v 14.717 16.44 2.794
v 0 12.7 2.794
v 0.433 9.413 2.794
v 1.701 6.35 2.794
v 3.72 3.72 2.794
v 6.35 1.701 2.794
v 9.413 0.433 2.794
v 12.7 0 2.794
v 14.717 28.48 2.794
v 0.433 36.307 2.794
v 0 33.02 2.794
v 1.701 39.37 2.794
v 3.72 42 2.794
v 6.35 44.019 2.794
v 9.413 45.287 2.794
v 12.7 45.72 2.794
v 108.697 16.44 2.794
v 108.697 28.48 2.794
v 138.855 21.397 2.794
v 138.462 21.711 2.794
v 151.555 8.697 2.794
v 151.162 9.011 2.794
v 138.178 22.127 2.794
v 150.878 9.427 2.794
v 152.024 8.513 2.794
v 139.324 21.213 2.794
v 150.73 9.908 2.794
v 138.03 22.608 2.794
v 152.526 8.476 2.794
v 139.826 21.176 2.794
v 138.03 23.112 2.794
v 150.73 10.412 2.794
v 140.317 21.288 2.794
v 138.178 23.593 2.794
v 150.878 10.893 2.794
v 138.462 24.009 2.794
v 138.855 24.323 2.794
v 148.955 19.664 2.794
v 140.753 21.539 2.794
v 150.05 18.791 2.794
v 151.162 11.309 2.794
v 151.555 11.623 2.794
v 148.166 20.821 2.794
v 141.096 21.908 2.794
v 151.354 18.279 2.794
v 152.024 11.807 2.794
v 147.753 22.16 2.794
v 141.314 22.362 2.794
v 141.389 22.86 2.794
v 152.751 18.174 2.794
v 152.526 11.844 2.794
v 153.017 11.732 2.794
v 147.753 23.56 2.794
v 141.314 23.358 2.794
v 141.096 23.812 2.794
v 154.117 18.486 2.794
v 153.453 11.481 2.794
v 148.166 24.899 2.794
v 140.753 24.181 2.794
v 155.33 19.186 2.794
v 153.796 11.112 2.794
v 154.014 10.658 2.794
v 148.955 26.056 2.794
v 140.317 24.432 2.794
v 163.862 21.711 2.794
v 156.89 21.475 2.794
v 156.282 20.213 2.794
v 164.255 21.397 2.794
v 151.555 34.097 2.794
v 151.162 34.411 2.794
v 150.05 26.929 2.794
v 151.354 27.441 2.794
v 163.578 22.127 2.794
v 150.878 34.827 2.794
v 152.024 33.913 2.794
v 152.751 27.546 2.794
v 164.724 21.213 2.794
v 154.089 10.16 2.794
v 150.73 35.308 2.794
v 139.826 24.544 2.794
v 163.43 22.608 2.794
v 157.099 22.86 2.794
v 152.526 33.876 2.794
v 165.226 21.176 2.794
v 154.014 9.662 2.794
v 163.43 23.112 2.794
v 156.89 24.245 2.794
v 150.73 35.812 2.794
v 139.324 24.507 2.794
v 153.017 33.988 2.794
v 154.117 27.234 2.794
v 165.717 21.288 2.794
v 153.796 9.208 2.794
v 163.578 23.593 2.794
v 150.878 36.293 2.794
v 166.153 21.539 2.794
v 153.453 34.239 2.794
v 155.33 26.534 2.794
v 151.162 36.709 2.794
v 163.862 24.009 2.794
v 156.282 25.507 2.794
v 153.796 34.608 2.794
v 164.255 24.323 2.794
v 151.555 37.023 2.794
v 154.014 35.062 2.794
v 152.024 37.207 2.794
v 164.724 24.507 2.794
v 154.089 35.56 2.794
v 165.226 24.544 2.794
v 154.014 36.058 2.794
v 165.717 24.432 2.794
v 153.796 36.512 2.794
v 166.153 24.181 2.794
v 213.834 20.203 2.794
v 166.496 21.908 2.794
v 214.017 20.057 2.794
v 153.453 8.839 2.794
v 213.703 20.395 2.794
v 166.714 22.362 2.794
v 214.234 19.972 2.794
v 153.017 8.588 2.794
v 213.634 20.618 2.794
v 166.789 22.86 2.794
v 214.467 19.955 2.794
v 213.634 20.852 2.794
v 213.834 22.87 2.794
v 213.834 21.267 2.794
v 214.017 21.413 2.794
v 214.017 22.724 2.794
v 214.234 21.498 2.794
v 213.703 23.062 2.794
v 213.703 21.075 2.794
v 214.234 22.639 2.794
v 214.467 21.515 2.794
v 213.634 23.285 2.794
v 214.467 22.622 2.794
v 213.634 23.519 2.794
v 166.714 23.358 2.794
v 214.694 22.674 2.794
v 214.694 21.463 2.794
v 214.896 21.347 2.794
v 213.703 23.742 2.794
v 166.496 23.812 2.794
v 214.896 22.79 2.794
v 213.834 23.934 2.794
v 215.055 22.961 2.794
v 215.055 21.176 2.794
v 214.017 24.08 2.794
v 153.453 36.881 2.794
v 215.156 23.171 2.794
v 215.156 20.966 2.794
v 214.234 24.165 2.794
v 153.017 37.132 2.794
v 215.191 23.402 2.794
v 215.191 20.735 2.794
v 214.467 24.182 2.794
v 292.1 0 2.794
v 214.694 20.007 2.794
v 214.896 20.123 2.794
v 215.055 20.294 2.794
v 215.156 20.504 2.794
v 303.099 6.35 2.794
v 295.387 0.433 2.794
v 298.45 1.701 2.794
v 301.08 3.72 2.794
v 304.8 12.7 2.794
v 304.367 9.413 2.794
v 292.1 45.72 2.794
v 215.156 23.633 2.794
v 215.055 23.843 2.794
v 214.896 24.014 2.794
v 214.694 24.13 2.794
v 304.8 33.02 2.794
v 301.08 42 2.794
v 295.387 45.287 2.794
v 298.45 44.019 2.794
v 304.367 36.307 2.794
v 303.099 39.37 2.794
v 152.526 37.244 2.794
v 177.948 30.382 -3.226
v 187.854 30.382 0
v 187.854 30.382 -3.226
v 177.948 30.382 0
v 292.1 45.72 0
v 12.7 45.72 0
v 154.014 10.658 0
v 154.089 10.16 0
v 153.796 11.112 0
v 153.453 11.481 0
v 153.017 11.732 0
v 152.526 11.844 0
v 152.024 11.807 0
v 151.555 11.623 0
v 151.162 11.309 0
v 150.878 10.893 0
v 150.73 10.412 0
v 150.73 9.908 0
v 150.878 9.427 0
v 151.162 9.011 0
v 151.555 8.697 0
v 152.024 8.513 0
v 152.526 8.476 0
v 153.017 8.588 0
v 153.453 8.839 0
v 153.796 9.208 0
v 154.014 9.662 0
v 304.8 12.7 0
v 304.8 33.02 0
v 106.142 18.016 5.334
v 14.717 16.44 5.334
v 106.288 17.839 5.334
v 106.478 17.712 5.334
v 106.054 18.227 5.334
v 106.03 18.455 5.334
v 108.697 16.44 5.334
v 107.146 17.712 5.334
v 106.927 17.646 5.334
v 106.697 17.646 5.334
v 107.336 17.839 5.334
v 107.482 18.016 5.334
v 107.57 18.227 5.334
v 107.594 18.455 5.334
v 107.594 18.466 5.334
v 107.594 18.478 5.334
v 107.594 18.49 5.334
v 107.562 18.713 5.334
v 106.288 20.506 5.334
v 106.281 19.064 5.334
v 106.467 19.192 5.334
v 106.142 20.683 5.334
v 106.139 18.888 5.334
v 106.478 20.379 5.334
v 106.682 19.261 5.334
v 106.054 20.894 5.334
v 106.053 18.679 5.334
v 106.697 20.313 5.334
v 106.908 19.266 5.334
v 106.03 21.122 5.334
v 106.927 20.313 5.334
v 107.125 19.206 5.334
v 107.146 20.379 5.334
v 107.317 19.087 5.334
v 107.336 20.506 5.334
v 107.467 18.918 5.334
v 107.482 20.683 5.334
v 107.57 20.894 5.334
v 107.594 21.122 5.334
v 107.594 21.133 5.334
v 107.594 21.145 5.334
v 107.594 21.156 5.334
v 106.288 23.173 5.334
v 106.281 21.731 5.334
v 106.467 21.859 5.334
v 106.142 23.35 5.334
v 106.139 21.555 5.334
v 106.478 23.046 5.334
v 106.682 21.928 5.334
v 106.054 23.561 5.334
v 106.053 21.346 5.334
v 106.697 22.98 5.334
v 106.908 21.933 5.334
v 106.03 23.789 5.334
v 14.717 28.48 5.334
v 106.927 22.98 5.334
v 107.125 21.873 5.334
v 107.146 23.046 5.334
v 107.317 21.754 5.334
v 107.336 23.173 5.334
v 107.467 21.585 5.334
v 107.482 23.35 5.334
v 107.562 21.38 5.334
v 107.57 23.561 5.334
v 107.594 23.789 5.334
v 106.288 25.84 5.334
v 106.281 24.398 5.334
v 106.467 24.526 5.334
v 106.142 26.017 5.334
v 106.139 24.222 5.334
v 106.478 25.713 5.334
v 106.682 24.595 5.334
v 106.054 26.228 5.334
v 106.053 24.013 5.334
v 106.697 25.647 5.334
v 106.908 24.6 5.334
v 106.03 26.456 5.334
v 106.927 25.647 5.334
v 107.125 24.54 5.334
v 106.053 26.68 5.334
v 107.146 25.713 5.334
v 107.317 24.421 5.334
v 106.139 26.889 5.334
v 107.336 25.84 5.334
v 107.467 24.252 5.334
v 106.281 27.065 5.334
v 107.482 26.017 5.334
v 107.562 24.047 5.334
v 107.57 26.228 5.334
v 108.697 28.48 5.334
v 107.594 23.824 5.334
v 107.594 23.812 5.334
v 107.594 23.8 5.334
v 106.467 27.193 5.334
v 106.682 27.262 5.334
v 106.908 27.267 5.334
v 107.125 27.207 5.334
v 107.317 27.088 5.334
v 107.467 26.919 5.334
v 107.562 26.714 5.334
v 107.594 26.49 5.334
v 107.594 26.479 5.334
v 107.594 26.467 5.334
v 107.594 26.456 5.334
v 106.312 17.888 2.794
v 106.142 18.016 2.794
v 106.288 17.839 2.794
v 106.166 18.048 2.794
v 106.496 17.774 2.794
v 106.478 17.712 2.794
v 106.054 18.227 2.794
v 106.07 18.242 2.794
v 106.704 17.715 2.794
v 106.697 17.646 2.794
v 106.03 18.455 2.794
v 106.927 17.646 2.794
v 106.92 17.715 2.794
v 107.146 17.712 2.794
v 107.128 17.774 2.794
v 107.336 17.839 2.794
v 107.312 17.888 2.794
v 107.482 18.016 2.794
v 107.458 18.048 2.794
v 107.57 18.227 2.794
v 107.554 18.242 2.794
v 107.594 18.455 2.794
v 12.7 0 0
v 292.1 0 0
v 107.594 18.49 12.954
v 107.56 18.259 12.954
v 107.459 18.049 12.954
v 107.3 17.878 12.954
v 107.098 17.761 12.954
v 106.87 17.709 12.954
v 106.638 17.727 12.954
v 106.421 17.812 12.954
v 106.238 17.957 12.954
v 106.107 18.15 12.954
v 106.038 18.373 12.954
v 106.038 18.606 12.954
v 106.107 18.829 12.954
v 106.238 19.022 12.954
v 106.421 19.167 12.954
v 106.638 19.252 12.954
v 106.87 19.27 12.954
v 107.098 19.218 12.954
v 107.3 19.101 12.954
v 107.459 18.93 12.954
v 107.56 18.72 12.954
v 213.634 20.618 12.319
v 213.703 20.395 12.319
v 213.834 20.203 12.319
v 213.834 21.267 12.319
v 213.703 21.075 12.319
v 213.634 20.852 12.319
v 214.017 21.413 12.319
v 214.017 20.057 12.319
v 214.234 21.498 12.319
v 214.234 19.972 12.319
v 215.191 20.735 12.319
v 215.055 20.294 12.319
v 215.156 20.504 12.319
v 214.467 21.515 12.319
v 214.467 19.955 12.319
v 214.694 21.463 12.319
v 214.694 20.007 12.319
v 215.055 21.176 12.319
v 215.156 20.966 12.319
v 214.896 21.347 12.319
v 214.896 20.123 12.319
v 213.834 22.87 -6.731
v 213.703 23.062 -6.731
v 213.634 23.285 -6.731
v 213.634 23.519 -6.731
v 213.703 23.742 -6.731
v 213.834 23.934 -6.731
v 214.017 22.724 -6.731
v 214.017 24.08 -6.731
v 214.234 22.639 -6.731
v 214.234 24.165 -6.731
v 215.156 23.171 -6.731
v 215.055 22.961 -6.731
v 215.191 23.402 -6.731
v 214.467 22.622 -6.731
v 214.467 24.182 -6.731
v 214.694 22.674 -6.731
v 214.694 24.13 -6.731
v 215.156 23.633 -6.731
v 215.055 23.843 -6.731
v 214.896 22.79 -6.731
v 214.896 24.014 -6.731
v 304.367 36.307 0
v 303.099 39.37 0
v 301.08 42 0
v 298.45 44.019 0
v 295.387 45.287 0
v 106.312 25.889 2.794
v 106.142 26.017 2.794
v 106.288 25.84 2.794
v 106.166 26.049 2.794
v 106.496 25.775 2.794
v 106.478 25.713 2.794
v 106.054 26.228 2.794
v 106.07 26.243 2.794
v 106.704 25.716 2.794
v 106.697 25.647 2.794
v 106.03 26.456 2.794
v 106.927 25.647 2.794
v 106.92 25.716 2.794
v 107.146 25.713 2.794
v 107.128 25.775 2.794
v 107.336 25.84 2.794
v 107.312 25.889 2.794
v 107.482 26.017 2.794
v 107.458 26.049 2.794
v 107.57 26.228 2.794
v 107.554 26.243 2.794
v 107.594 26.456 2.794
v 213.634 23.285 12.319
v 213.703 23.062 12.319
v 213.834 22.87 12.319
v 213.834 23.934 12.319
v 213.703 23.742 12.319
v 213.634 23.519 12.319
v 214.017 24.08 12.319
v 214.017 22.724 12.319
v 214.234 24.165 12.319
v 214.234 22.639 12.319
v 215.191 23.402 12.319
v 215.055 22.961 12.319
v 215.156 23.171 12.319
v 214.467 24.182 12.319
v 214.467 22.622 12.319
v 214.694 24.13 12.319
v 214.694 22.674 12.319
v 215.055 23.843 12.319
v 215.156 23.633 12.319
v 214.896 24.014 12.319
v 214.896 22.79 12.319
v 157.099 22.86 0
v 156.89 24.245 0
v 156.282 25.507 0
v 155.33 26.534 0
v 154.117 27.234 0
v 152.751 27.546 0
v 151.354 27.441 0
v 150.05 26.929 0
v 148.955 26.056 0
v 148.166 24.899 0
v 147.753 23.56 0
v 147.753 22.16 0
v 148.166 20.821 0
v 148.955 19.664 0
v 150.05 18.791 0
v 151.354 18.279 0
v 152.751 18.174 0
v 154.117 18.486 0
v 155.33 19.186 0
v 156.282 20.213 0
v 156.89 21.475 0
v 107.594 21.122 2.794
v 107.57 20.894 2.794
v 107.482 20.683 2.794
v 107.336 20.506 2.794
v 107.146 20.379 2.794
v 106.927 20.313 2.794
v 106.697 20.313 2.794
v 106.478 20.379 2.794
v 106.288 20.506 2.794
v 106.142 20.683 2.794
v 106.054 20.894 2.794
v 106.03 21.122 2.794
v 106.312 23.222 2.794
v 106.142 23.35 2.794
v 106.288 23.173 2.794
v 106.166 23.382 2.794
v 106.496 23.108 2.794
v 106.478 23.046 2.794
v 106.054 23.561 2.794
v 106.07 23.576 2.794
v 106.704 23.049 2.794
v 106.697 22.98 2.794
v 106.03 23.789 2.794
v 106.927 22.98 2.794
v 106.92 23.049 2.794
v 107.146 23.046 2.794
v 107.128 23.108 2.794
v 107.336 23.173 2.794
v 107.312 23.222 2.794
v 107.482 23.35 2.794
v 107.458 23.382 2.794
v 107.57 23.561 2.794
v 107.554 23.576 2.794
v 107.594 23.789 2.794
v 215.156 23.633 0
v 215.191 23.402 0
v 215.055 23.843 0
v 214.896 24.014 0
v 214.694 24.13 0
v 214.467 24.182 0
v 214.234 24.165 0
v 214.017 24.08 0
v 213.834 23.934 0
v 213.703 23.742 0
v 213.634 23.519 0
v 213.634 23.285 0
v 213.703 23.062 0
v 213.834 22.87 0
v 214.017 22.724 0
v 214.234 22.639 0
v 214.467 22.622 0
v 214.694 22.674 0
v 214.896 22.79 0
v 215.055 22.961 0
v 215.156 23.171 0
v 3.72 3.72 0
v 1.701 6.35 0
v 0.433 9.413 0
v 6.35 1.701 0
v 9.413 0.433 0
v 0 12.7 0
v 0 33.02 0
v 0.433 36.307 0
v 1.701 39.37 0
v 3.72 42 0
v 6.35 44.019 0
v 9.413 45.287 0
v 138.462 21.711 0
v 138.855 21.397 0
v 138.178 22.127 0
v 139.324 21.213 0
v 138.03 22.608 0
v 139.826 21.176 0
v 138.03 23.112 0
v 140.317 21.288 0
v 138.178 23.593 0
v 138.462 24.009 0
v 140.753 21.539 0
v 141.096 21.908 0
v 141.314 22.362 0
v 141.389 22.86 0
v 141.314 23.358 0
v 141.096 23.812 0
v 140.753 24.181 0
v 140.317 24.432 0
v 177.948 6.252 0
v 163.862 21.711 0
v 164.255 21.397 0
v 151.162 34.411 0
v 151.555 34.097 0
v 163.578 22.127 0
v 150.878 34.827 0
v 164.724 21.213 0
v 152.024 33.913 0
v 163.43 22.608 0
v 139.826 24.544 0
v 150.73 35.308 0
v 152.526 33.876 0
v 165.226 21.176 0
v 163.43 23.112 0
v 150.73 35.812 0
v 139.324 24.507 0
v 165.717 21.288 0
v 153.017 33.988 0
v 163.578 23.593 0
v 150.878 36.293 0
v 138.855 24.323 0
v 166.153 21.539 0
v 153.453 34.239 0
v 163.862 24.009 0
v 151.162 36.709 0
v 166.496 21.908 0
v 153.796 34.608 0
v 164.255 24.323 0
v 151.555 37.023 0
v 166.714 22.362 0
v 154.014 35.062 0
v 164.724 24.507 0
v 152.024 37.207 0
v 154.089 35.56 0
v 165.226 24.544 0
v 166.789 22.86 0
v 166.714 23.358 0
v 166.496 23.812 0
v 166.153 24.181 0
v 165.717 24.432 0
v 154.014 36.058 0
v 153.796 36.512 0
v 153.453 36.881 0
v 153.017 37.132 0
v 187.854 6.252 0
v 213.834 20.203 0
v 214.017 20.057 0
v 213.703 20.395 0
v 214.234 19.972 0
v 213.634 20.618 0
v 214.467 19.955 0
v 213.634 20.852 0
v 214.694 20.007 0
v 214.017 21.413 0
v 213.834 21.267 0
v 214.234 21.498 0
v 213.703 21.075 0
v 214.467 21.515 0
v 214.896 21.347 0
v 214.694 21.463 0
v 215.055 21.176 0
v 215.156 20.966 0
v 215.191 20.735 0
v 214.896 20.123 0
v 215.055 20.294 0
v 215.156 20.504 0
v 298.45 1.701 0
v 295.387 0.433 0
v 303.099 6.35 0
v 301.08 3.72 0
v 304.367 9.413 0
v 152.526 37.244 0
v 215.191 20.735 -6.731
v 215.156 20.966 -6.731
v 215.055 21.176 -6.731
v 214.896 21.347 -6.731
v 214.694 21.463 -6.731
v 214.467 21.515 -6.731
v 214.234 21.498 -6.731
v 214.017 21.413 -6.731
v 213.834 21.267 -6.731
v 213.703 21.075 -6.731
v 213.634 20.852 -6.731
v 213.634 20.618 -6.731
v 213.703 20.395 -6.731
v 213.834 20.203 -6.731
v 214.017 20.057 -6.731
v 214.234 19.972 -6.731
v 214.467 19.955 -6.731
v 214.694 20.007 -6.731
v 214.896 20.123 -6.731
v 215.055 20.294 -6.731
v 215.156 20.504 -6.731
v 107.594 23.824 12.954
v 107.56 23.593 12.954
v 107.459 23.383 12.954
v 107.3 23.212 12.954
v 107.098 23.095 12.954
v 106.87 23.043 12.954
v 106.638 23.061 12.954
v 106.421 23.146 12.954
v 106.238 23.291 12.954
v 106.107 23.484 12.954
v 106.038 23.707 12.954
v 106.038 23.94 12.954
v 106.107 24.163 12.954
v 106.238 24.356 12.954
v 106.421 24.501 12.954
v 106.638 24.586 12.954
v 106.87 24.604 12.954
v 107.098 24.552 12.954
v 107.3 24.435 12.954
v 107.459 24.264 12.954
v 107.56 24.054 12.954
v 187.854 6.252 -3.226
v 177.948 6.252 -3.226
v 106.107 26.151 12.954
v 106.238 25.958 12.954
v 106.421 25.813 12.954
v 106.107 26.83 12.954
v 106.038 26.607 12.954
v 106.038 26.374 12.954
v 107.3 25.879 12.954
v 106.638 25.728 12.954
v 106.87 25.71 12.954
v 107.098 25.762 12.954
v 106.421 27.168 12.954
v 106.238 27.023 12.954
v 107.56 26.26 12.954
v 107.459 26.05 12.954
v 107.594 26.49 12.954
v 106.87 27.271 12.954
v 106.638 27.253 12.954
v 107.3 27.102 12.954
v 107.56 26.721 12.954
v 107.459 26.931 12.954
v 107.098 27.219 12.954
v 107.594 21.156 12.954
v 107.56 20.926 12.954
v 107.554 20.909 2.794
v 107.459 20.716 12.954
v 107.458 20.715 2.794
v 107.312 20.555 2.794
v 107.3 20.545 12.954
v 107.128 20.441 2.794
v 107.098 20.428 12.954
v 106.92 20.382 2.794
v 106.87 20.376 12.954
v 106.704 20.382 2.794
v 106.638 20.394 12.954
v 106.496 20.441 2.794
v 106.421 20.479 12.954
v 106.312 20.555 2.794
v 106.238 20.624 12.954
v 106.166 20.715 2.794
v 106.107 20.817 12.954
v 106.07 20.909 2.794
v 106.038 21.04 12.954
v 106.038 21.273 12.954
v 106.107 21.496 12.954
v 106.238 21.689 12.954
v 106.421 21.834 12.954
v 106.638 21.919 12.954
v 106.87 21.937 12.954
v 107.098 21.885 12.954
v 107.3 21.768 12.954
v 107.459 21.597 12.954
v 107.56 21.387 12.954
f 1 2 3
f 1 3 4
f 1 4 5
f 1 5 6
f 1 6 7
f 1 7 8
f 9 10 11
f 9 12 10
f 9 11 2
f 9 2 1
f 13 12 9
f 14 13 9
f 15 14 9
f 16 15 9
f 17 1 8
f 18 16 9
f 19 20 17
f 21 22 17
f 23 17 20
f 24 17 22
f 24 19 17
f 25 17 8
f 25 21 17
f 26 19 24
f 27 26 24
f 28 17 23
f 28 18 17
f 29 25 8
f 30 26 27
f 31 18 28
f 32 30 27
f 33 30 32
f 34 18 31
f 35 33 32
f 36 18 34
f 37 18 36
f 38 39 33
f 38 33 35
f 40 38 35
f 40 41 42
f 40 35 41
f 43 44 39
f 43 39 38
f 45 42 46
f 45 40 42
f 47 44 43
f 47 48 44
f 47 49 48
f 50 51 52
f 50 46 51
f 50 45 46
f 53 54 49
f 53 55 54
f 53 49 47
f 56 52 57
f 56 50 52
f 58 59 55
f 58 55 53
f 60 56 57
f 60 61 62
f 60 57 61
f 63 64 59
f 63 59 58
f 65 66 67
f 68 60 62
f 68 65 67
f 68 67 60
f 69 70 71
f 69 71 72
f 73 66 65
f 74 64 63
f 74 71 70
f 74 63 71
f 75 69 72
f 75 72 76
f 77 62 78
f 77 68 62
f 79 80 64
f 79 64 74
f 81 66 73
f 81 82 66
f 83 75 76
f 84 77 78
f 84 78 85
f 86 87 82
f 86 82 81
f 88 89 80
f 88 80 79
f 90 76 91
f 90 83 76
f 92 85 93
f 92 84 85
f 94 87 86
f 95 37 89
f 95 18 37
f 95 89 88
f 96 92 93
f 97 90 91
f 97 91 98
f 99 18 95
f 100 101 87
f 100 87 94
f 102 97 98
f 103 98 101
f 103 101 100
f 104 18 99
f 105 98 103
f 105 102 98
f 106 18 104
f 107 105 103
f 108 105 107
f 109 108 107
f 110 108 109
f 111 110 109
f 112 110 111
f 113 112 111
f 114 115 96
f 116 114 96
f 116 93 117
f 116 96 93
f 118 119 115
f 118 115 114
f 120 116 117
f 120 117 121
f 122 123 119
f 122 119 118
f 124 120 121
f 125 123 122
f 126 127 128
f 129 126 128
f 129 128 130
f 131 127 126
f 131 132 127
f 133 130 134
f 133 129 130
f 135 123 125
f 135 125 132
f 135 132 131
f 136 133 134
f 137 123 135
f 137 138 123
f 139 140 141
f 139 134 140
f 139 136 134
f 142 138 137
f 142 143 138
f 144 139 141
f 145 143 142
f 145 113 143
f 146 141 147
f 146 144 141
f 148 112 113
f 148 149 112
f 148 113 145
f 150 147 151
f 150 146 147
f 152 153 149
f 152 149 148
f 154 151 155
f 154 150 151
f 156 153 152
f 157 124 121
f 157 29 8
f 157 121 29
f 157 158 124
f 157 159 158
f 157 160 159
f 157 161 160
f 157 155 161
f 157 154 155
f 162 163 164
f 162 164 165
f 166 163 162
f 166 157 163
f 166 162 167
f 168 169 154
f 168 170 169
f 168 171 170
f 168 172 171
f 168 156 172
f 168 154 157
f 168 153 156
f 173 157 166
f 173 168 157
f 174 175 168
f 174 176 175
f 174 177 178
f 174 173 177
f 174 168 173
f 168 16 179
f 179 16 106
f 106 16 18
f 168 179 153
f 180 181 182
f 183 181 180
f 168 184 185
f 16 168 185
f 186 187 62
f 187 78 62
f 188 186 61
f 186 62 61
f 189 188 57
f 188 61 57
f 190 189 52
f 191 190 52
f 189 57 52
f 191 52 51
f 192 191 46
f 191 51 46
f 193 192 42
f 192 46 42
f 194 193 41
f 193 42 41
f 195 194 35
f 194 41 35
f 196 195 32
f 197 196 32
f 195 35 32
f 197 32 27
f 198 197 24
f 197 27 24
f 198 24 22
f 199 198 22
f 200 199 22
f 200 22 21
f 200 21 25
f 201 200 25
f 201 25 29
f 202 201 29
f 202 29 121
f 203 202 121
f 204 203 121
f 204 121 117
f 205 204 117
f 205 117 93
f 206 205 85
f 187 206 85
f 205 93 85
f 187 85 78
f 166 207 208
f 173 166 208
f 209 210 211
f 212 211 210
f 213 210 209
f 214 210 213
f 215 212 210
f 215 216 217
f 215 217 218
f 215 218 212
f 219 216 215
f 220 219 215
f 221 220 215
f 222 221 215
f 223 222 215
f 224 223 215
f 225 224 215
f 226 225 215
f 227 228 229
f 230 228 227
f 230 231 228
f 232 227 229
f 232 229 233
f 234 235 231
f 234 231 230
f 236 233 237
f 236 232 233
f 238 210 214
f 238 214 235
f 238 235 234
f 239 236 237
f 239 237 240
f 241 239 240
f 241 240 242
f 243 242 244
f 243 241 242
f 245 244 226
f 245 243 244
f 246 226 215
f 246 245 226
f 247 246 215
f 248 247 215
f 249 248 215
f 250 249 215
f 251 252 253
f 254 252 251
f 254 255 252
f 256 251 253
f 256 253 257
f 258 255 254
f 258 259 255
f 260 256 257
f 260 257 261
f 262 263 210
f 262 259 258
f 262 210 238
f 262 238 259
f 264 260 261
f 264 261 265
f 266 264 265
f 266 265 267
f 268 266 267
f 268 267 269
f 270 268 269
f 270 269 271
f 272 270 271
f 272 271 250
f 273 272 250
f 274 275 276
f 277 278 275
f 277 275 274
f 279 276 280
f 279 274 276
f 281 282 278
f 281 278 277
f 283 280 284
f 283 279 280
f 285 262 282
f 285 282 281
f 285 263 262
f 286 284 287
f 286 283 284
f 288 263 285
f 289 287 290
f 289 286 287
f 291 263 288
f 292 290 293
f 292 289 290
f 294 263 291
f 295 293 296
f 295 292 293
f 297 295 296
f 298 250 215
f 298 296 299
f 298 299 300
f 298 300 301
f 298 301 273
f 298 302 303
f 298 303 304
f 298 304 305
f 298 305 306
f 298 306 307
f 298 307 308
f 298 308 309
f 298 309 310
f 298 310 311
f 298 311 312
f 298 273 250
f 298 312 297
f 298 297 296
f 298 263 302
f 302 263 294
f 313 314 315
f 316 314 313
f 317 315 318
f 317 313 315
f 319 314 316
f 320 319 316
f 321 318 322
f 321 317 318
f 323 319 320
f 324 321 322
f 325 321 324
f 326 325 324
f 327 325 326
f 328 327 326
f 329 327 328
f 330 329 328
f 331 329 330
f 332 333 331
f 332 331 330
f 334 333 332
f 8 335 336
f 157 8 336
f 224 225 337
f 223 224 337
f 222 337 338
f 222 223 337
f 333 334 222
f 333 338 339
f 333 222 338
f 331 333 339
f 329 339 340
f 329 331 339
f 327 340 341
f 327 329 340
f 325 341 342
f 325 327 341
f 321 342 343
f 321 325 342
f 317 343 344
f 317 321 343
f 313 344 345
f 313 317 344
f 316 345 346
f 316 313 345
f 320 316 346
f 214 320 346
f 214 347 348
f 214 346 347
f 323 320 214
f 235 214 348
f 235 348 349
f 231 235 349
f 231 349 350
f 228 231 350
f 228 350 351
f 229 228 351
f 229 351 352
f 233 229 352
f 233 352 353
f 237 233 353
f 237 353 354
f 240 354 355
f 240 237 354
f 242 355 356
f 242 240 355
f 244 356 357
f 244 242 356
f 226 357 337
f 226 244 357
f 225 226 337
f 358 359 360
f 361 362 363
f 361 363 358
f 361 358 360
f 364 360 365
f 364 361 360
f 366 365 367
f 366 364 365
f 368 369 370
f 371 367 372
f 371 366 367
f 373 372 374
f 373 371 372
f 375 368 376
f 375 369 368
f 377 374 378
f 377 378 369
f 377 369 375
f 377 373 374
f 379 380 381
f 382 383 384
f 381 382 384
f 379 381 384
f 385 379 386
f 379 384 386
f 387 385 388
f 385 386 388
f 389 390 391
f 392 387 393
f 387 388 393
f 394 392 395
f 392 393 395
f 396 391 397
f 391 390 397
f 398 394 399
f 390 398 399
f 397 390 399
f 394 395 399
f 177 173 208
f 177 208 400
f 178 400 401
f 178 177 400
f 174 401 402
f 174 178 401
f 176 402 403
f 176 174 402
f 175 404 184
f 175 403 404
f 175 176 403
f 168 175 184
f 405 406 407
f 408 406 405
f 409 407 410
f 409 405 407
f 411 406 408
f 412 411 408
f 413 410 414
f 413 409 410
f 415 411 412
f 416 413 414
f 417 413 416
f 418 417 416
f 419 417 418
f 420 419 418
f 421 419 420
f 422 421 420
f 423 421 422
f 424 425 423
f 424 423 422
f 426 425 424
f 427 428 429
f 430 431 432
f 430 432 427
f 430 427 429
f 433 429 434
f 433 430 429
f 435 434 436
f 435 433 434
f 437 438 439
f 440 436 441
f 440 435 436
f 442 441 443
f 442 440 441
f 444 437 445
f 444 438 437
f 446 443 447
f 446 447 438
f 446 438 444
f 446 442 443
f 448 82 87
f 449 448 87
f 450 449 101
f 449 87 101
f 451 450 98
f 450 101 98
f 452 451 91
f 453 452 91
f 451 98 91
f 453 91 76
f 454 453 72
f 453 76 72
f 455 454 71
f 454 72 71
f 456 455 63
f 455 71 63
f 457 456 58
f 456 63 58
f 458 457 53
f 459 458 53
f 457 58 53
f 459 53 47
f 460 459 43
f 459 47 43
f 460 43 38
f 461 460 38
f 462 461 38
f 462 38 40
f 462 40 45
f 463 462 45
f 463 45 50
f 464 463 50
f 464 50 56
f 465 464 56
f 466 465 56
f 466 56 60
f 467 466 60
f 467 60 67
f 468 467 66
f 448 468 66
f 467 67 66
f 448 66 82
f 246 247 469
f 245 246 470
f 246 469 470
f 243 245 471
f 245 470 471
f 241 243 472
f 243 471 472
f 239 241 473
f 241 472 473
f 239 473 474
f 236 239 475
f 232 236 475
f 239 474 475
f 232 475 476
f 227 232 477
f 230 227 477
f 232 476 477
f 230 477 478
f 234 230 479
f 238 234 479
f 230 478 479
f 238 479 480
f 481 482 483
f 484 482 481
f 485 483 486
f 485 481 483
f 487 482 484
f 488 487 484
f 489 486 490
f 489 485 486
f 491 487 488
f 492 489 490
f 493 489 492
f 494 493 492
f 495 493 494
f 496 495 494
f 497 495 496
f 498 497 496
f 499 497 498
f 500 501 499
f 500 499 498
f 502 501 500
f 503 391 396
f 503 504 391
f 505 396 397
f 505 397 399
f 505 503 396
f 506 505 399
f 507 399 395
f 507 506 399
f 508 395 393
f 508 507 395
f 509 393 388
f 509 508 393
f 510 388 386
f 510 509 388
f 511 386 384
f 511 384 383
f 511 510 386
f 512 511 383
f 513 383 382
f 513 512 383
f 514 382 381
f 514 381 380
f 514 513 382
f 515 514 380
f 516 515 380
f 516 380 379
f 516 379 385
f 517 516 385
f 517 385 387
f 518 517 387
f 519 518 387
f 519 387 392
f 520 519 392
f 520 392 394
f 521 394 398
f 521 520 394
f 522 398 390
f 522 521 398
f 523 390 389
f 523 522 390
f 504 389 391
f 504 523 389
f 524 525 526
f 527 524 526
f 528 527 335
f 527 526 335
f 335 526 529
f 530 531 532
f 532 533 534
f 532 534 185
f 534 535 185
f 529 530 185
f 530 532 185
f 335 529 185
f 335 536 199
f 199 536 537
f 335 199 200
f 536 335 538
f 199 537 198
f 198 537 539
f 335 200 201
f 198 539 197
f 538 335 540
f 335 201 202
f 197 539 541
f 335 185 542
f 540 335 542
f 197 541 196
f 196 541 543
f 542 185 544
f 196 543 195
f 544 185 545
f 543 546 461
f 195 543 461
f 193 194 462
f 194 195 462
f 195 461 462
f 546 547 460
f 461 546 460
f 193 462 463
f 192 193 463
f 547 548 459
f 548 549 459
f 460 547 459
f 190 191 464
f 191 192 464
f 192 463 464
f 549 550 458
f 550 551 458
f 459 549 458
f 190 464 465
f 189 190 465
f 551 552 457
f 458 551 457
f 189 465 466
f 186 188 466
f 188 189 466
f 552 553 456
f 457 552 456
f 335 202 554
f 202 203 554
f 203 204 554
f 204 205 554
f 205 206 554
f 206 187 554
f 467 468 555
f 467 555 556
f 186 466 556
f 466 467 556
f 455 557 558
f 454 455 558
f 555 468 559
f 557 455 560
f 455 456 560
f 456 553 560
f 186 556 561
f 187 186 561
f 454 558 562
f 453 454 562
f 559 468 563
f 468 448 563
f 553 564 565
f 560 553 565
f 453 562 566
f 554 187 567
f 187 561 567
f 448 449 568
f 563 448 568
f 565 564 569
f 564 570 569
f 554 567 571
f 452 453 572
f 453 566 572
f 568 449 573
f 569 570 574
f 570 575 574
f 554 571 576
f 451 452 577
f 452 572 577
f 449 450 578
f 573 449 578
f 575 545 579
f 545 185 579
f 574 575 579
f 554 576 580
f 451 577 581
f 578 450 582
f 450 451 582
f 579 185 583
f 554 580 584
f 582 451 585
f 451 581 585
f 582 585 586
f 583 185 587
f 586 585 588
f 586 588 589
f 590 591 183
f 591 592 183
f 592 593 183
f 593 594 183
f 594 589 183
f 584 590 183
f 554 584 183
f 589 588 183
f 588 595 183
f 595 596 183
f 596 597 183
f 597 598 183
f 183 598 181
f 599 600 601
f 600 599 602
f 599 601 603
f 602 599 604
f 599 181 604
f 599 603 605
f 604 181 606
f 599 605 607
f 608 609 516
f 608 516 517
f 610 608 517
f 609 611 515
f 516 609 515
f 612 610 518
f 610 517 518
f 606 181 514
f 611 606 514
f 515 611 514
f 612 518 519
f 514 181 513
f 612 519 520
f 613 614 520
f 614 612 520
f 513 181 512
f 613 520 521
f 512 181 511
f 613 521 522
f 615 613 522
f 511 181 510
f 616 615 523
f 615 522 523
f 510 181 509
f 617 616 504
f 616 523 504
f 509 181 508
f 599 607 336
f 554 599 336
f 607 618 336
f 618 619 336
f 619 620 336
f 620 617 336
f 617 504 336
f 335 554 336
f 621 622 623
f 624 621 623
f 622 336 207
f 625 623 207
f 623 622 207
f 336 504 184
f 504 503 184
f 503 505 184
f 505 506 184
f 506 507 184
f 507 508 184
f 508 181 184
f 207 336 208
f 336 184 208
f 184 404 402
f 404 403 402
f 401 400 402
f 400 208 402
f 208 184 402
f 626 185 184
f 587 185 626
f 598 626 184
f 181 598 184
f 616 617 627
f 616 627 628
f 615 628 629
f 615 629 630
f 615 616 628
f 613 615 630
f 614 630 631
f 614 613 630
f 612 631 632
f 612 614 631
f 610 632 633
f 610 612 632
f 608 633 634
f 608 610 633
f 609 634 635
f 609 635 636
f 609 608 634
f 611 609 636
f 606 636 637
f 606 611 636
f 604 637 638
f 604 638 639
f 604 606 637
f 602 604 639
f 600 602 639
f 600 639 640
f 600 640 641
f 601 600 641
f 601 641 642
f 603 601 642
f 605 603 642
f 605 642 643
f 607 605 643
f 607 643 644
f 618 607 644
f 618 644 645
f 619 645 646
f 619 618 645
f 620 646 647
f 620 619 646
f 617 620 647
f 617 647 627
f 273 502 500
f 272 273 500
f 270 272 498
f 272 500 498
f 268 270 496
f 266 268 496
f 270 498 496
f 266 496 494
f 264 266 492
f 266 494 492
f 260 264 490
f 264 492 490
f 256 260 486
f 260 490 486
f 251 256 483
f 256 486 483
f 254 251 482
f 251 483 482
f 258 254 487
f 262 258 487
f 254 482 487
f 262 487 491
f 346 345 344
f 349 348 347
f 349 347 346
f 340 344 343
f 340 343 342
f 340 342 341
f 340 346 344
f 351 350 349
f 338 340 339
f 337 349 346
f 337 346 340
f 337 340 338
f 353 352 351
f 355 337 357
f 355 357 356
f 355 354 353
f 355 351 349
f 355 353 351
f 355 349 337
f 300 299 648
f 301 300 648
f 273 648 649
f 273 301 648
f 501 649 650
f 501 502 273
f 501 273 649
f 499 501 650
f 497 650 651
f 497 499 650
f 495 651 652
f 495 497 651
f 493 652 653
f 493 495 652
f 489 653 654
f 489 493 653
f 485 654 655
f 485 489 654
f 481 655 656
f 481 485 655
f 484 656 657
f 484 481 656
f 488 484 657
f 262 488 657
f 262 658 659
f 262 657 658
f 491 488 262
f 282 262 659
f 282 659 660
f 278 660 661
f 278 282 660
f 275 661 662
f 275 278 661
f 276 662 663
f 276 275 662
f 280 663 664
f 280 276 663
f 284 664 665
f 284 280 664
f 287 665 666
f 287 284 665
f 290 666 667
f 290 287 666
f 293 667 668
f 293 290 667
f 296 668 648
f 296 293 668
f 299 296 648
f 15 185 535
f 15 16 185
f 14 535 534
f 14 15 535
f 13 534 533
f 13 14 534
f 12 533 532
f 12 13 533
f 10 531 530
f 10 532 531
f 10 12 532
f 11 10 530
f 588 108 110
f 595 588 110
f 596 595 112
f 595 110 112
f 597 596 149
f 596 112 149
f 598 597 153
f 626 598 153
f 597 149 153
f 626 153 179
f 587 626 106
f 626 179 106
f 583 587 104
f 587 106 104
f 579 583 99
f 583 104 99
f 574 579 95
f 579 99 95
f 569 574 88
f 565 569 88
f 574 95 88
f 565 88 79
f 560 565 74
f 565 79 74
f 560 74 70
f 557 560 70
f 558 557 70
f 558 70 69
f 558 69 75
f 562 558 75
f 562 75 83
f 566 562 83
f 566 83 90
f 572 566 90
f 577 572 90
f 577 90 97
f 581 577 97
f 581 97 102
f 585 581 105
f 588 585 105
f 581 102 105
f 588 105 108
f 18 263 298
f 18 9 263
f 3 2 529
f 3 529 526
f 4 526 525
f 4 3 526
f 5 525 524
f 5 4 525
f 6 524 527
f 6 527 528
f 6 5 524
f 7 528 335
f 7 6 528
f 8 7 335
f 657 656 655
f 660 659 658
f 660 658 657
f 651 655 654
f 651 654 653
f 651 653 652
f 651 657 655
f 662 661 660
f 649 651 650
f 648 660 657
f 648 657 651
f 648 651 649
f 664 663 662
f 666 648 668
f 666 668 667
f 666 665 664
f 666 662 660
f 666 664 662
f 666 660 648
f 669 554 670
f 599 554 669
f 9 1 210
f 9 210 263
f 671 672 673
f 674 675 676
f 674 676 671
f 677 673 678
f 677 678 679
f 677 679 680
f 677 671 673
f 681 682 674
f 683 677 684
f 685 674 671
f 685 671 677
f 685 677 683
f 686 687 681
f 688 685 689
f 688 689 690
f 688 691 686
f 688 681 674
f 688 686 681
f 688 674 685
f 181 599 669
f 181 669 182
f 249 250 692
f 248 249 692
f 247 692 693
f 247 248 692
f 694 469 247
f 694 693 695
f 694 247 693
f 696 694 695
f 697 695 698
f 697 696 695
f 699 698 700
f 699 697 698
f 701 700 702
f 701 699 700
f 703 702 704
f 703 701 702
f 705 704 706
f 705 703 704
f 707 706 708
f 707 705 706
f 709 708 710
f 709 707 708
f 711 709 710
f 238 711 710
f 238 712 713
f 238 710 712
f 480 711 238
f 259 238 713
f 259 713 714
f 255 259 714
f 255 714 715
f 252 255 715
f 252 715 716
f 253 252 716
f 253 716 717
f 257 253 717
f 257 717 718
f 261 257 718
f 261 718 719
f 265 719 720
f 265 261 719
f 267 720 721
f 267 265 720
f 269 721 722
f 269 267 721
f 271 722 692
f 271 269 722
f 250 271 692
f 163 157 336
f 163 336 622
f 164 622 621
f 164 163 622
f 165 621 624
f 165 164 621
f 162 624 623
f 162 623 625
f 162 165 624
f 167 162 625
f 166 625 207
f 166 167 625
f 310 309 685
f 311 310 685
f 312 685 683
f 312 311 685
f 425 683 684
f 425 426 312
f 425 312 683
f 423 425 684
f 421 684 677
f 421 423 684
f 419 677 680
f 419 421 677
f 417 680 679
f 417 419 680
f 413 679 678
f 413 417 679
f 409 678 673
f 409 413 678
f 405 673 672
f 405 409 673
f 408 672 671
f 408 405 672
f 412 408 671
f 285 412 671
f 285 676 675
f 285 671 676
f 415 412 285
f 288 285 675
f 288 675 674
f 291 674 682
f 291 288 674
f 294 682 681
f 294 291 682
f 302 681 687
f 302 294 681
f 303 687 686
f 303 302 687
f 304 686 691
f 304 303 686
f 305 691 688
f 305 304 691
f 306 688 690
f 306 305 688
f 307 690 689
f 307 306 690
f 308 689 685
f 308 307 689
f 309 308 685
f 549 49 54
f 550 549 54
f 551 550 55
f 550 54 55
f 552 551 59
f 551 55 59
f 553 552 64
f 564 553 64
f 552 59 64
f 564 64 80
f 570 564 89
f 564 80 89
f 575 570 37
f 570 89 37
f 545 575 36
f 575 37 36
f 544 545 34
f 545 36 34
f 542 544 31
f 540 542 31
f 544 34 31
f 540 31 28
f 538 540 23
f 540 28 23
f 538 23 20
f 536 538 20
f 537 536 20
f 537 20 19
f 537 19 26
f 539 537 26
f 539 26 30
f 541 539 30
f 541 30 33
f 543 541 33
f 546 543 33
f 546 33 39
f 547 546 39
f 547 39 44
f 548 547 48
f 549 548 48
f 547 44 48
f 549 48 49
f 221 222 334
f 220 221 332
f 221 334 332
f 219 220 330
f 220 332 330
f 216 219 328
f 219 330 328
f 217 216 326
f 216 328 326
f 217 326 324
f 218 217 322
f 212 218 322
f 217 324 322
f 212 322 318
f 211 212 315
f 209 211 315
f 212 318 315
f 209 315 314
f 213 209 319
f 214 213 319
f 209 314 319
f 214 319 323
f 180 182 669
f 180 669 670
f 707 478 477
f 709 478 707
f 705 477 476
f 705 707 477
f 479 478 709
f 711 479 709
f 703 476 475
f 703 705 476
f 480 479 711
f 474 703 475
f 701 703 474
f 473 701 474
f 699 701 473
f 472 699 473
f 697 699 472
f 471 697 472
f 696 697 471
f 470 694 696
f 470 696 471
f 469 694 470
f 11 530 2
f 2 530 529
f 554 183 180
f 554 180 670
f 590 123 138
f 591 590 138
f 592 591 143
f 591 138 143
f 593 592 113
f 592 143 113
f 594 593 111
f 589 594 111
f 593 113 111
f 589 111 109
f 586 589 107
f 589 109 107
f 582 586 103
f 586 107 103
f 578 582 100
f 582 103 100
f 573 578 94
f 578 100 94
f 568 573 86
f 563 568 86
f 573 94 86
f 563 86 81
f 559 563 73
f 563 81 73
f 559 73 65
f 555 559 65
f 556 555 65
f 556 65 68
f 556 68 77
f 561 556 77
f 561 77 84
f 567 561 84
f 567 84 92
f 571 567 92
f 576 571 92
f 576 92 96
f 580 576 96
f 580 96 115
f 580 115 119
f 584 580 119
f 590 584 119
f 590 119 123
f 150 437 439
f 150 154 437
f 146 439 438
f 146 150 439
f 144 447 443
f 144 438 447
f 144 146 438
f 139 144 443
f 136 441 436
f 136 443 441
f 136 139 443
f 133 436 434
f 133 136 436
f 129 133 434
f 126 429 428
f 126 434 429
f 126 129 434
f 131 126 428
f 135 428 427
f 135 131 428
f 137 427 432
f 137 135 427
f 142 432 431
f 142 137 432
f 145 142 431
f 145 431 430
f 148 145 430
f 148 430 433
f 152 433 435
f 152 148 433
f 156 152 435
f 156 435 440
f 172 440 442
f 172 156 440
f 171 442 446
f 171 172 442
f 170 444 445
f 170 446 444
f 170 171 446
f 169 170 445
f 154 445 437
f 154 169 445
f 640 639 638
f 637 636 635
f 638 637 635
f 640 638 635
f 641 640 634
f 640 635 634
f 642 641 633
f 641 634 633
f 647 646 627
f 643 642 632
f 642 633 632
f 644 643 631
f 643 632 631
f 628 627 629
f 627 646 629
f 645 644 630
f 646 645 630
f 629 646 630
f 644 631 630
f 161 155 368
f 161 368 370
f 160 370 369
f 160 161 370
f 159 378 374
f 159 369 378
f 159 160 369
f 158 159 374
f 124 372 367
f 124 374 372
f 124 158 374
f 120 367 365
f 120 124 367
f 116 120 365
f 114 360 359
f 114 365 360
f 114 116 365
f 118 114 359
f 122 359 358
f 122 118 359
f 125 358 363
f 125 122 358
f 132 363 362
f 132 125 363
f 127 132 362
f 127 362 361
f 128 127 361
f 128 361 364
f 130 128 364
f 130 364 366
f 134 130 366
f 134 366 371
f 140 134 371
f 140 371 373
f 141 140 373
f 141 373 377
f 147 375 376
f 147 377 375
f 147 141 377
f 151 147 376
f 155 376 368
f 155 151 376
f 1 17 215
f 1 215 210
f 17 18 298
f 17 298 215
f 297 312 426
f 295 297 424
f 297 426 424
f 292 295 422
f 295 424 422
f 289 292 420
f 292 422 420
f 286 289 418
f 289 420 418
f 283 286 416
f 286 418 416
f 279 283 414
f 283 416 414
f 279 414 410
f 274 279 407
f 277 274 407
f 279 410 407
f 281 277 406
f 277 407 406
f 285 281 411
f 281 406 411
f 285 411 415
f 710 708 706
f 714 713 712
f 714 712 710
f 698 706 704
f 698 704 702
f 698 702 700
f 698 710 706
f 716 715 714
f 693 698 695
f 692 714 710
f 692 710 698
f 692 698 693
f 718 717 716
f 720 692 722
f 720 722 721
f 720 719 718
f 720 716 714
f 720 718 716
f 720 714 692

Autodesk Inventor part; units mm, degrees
ref_plane "YZ Plane" through (0, 0, 0) normal (1, 0, 0) x (0, 1, 0)
ref_plane "XZ Plane" through (0, 0, 0) normal (0, 1, 0) x (-1, 0, 0)
ref_plane "XY Plane" through (0, 0, 0) normal (0, 0, 1) x (1, 0, 0)
sketch "Sketch1" plane through (0, 0, 0) normal (0, 0, 1) x (1, 0, 0)
  line L0 (0, 0) -> (304.8, 0)
  line L1 (304.8, 0) -> (304.8, 45.72)
  line L2 (304.8, 45.72) -> (0, 45.72)
  line L3 (0, 45.72) -> (0, 0)
  dimension "d0" = 304.8
  dimension "d1" = 45.72
extrude "Extrusion1" add sketch "Sketch1" along normal blind 2.794
sketch "Sketch2" plane through (0, 0, 2.794) normal (0, 0, 1) x (1, 0, 0)
  line L0 (114.3, 0) -> (190.5, 0)
  line L1 (190.5, 0) -> (190.5, 35.56)
  line L2 (190.5, 35.56) -> (114.3, 35.56)
  line L3 (114.3, 35.56) -> (114.3, 0)
  line L4 (114.3, 0) -> (190.5, 35.56) construction
  line L5 (190.5, 0) -> (114.3, 35.56) construction
  line L6 (108.6972, 16.51) -> (14.7172, 16.51)
  line L7 (14.7172, 16.51) -> (14.7172, 28.5496)
  line L8 (14.7172, 28.5496) -> (108.6972, 28.5496)
  line L9 (108.6972, 28.5496) -> (108.6972, 16.51)
  line L10 (108.6972, 16.51) -> (14.7172, 28.5496) construction
  line L11 (14.7172, 16.51) -> (108.6972, 28.5496) construction
  circle A0 centre (106.812, 26.4905) radius 0.7825
  line L12 (14.7172, 13.843) -> (108.6972, 25.8826) construction
  circle A1 centre (106.812, 23.8235) radius 0.7825
  line L13 (14.7172, 11.176) -> (108.6972, 23.2156) construction
  circle A2 centre (106.812, 21.1565) radius 0.7825
  line L14 (14.7172, 8.509) -> (108.6972, 20.5486) construction
  circle A3 centre (106.812, 18.4895) radius 0.7825
  line L15 (0, 0) -> (304.8, 0) projected
  line L16 (0, 45.72) -> (0, 0) projected
  point P0 (152.4, 17.78)
  point P1 (61.7072, 22.5298)
  dimension "d4" = 76.2
  dimension "d5" = 35.56
  dimension "d6" = 93.98
  dimension "d7" = 12.0396
  dimension "d10" = 2.667
  dimension "d56" = 16.51
  dimension "d57" = 14.7172
  dimension "d58" = 2.0591
  dimension "d59" = 1.8853
  dimension "d60" = 1.102
extrude "Extrusion2" add sketch "Sketch2" along normal blind 10.16 contours A0 | A1 | A2 | A3
sketch "Sketch3" plane through (0, 0, 2.794) normal (0, 0, 1) x (1, 0, 0)
  line L0 (114.3, 0) -> (190.5, 0)
  line L1 (190.5, 0) -> (190.5, 35.56)
  line L2 (190.5, 35.56) -> (114.3, 35.56)
  line L3 (114.3, 35.56) -> (114.3, 0)
  line L4 (114.3, 0) -> (190.5, 35.56) construction
  line L5 (190.5, 0) -> (114.3, 35.56) construction
  line L6 (108.6972, 16.4402) -> (14.7172, 16.4401)
  line L7 (14.7172, 16.4401) -> (14.7172, 28.4797)
  line L8 (14.7172, 28.4797) -> (108.6972, 28.4798)
  line L9 (108.6972, 28.4798) -> (108.6972, 16.4402)
  line L10 (108.6972, 16.4402) -> (14.7172, 28.4797) construction
  line L11 (14.7172, 16.4401) -> (108.6972, 28.4798) construction
  circle A0 centre (106.812, 26.4207) radius 0.7825
  line L12 (14.7172, 13.7731) -> (108.6972, 25.8128) construction
  circle A1 centre (106.812, 23.7537) radius 0.7825
  line L13 (14.7172, 11.1061) -> (108.6972, 23.1458) construction
  circle A2 centre (106.812, 21.0867) radius 0.7825
  line L14 (14.7172, 8.4391) -> (108.6972, 20.4788) construction
  circle A3 centre (106.812, 18.4197) radius 0.7825
  line L15 (304.8, 45.72) -> (0, 45.72) projected
  line L16 (0, 45.72) -> (0, 0) projected
  line L17 (0, 0) -> (304.8, 0) projected
  point P0 (152.4, 17.78)
  dimension "d17" = 76.2
  dimension "d18" = 35.56
  dimension "d19" = 93.98
  dimension "d20" = 12.0396
  dimension "d21" = 2.667
  dimension "d63" = 2.0591
  dimension "d64" = 1.8853
  dimension "d68" = 16.4401
extrude "Extrusion3" add sketch "Sketch3" along normal blind 2.54 contours L6 L7 L8 L9
sketch "Sketch5" plane through (0, 0, 2.794) normal (0, 0, 1) x (1, 0, 0)
  circle A0 centre (106.812, 23.8235) radius 0.7825 projected
  circle A1 centre (106.812, 21.1565) radius 0.7825 projected
  circle A2 centre (214.4081, 23.402) radius 0.7825
  circle A3 centre (214.4081, 20.735) radius 0.7825
  line L0 (108.6972, 16.4402) -> (108.6972, 28.4798) projected
  point P0 (0, 0)
  dimension "d65" = 107.5969
  dimension "d66" = 105.7108
  dimension "d67" = 107.5961
extrude "Extrusion4" add sketch "Sketch5" along normal mid plane 19.05 contours A2 | A3
sketch "Sketch6" plane through (0, 0, 2.794) normal (0, 0, 1) x (1, 0, 0)
  circle A0 centre (152.4, 35.56) radius 1.6891
  circle A1 centre (152.4, 10.16) radius 1.6891
  circle A2 centre (165.1, 22.86) radius 1.6891
  circle A3 centre (139.7, 22.86) radius 1.6891
  circle A4 centre (152.4, 22.86) radius 4.699
  line L0 (304.8, 45.72) -> (0, 45.72) projected
  line L1 (0, 45.72) -> (0, 0) projected
  dimension "d37" = 3.3782
  dimension "d38" = 3.3782
  dimension "d39" = 3.3782
  dimension "d40" = 3.3782
  dimension "d47" = 9.398
  dimension "d78" = 12.7
  dimension "d79" = 12.7
  dimension "d81" = 12.7
  dimension "d82" = 12.7
  dimension "d83" = 0
extrude "Extrusion5" cut sketch "Sketch6" against normal blind 8.89
fillet "Fillet1" radius 12.7 4 edges at (304.8, 0, 1.397) (304.8, 45.72, 1.397) (0, 0, 1.397) (0, 45.72, 1.397)
sketch "Sketch8" plane through (0, 0, 0) normal (0, 0, -1) x (-1, 0, 0)
  line L0 (-177.9476, 6.2522) -> (-187.8536, 6.2522)
  line L1 (-187.8536, 6.2522) -> (-187.8536, 30.3822)
  line L2 (-187.8536, 30.3822) -> (-177.9476, 30.3822)
  line L3 (-177.9476, 30.3822) -> (-177.9476, 6.2522)
  point P0 (0, 0)
  dimension "d48" = 9.906
  dimension "d49" = 24.13
extrude "Extrusion6" add sketch "Sketch8" along normal blind 3.2258
sketch "Sketch9" plane through (0, 0, 2.794) normal (0, 0, 1) x (1, 0, 0)
  line L0 (102.87, 1.27) -> (217.17, 1.27)
  line L1 (217.17, 1.27) -> (217.17, 44.45)
  line L2 (217.17, 44.45) -> (102.87, 44.45)
  line L3 (102.87, 44.45) -> (102.87, 1.27)
  line L4 (102.87, 1.27) -> (217.17, 44.45) construction
  line L5 (217.17, 1.27) -> (102.87, 44.45) construction
  line L6 (12.7, 0) -> (292.1, 0) projected
  line L7 (304.8, 12.7) -> (304.8, 33.02) projected
  point P0 (160.02, 22.86)
  dimension "d69" = 114.3
  dimension "d70" = 43.18
  dimension "d76" = 44.45
  dimension "d77" = 87.63
properties part number "Base"
